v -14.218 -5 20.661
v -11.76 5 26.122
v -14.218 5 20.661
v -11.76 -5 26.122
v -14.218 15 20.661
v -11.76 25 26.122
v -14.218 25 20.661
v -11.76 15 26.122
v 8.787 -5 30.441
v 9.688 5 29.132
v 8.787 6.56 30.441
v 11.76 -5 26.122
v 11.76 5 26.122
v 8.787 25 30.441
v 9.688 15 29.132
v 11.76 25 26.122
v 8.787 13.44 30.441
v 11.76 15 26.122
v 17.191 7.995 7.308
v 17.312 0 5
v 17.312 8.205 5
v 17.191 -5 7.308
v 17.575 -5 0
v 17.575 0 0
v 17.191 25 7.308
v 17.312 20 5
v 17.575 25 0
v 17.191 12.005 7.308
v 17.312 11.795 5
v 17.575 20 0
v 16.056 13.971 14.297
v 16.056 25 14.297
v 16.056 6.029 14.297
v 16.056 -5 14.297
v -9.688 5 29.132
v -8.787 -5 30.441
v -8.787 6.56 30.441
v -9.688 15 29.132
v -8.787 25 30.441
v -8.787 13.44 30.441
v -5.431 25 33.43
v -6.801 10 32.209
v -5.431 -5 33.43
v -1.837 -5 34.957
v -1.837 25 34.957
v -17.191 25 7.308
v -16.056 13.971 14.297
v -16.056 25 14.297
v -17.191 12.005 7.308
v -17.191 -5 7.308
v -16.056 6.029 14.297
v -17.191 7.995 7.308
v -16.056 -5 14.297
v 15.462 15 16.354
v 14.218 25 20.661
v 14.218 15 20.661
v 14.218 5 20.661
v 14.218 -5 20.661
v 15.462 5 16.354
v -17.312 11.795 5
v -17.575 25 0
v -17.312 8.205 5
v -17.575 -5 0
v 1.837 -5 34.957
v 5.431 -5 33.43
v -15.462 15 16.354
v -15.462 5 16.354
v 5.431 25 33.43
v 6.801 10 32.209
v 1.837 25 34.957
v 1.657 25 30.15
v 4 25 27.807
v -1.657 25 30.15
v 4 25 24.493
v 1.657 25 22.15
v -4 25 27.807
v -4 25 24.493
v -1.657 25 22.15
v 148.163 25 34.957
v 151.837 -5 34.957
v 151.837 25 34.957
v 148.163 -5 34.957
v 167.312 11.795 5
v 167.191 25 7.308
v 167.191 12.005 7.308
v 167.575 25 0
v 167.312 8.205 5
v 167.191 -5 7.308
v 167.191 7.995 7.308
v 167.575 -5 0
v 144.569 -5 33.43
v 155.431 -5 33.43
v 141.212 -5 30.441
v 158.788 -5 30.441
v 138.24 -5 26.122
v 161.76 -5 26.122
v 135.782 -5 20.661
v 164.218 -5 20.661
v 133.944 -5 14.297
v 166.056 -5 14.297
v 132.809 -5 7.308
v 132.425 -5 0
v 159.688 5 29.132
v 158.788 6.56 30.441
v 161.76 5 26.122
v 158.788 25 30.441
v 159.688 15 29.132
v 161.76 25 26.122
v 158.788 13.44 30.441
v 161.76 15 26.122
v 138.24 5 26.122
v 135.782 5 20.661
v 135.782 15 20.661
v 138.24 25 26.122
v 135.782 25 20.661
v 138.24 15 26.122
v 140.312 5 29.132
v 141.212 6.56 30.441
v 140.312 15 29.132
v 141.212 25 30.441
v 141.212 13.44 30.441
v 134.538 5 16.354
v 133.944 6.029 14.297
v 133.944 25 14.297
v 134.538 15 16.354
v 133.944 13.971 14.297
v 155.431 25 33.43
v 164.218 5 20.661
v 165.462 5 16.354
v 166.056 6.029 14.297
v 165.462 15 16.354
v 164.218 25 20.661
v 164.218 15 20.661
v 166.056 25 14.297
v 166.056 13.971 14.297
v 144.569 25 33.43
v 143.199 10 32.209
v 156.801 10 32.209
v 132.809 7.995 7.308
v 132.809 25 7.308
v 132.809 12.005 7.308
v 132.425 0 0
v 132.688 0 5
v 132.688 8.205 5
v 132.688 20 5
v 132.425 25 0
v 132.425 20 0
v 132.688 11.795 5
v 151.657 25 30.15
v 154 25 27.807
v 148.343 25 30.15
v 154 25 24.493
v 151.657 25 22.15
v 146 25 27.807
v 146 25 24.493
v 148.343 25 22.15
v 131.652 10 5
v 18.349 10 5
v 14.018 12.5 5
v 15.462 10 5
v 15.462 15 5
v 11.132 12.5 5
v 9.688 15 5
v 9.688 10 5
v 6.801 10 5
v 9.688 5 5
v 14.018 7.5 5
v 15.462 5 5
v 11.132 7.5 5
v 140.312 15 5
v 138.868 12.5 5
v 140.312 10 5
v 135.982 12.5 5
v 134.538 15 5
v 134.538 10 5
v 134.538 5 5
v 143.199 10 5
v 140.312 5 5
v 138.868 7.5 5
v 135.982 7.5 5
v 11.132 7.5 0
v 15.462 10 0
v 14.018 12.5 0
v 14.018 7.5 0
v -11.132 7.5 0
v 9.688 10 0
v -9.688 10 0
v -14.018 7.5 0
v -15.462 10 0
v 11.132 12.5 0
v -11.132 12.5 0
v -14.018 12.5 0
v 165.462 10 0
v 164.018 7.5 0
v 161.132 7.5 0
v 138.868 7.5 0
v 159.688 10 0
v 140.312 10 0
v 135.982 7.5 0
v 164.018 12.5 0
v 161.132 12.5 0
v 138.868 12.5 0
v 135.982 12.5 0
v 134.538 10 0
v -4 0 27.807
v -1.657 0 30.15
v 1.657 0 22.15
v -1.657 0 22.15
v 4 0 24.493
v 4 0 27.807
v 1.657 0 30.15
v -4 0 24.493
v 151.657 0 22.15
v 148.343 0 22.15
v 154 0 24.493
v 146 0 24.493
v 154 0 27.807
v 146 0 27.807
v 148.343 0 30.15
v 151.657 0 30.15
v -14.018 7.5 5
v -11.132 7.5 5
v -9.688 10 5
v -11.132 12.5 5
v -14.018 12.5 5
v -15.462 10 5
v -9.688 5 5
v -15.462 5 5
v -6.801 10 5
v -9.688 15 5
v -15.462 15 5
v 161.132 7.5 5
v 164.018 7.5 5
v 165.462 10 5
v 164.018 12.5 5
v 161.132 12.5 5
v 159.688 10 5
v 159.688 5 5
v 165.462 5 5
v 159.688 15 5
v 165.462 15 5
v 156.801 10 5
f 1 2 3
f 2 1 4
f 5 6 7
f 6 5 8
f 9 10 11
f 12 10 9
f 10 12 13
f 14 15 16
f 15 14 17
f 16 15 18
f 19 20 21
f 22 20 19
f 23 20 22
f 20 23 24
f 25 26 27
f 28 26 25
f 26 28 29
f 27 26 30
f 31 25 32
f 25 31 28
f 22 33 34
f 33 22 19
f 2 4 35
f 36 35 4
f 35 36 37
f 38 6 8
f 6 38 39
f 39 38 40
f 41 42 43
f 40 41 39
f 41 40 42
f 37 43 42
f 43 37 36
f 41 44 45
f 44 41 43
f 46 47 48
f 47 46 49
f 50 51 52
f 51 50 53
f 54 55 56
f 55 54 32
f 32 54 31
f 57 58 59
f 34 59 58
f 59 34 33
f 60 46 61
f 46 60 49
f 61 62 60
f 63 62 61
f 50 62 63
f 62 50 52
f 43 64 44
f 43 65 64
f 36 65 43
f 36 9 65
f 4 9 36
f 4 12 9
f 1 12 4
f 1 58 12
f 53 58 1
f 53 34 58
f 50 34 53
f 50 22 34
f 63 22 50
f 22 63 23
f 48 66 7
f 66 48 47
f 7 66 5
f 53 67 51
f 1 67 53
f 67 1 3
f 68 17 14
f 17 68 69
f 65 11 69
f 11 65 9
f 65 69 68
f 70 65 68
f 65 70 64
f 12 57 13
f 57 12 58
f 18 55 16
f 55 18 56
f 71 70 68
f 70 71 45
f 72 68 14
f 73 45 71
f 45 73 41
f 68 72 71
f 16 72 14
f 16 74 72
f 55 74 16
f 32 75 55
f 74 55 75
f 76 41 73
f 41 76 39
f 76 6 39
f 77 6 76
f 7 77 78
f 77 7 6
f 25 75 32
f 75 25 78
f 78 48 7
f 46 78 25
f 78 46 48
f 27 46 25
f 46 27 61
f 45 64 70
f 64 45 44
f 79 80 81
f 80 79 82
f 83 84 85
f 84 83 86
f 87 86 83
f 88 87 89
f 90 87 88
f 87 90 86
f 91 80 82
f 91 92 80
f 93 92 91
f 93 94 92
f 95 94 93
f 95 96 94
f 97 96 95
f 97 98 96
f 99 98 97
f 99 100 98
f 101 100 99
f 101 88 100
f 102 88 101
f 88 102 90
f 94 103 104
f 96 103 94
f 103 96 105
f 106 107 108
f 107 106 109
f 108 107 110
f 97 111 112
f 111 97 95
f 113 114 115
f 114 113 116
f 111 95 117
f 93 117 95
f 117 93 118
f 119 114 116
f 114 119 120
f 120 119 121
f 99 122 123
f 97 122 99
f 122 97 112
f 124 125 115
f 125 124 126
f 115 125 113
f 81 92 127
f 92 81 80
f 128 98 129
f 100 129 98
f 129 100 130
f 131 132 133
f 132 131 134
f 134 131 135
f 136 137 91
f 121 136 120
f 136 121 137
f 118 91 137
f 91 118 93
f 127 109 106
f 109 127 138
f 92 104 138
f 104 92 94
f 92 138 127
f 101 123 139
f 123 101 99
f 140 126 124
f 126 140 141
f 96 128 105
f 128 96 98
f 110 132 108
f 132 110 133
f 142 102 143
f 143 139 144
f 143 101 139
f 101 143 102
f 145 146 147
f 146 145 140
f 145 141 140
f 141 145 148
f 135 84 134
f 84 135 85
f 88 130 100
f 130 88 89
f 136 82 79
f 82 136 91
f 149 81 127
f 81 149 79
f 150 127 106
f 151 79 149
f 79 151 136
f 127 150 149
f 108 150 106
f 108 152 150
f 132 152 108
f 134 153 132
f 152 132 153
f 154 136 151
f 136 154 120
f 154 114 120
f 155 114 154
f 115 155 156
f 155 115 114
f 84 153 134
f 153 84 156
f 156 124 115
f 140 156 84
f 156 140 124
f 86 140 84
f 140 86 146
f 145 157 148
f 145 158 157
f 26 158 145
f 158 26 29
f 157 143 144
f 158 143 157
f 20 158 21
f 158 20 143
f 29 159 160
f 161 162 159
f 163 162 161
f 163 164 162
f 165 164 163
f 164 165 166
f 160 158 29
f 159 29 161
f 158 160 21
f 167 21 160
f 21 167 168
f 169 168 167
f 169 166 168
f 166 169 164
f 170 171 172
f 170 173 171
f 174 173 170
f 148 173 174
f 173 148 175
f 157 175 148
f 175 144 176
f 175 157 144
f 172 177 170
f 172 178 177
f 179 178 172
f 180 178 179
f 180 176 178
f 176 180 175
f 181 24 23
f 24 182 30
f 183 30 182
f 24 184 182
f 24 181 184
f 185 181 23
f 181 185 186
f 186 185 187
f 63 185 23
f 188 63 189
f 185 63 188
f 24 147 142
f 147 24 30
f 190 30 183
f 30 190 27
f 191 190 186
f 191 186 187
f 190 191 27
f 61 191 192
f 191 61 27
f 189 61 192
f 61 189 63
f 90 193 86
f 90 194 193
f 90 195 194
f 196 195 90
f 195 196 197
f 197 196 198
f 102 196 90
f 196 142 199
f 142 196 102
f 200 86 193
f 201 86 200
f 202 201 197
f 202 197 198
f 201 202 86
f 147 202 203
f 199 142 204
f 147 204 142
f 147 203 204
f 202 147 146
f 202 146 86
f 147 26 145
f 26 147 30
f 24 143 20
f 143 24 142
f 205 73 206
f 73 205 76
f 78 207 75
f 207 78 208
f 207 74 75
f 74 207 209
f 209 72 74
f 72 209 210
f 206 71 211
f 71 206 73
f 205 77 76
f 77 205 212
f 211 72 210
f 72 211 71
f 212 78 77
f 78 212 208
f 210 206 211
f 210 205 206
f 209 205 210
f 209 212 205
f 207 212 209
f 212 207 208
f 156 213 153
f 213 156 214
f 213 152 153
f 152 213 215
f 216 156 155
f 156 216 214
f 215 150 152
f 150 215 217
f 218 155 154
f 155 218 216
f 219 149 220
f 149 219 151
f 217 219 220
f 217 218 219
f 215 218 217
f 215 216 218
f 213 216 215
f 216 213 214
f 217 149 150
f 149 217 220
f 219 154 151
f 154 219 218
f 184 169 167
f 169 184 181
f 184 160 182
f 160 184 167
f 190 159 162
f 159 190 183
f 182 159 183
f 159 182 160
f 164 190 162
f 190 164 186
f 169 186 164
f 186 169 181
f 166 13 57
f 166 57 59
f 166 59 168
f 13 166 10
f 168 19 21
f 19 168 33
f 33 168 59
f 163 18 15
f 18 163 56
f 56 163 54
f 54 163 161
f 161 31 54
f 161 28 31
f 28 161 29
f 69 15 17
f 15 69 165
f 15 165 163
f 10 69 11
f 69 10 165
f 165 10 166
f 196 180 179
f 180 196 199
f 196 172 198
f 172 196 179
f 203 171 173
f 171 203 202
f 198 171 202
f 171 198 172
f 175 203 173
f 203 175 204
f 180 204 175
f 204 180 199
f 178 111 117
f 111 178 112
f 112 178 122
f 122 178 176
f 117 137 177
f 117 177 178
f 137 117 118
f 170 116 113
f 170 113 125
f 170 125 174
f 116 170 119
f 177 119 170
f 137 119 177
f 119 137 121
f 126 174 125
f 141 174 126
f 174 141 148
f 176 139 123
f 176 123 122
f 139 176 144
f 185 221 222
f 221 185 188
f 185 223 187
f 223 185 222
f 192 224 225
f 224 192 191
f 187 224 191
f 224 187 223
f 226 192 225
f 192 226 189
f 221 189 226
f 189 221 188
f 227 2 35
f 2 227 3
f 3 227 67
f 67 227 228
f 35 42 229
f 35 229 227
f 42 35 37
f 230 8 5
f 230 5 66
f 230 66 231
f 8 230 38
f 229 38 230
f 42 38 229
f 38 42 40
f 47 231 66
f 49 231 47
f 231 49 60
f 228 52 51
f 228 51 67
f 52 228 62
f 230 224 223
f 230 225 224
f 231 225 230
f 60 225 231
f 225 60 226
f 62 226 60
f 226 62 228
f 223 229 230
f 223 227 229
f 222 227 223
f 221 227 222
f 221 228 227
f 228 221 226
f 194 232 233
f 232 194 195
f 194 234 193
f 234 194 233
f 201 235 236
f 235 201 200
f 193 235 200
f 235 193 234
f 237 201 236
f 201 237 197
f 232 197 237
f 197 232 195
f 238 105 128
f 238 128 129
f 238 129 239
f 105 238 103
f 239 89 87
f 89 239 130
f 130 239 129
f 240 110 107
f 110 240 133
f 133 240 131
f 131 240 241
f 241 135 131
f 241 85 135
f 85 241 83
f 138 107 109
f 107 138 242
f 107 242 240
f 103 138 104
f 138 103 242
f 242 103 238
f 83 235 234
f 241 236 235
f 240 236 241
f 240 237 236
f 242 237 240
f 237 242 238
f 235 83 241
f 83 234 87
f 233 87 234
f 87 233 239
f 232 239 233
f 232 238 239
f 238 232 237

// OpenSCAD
// file: vars.scad
// Variables used throughout design.
// Yes, these could use some commenting.
// (c) 2014, Christopher "ScribbleJ" Jansen

// Printer outside dimensions are actually this + corner_thick*2.
printer_w = 400;
printer_l = 400;
printer_h = 400;

// Used wherever I need something arbitrarily large.
huge=500;

// 608 Bearings
//Added some extra space to the bearing retainer so I don't break them during assembly
bearing_w = 7*1.01;  
bearing_d = 22*1.01;
bearing_r = bearing_d/2;
bearing_hole_d = 8;
bearing_hole_r = bearing_hole_d/2;

// Miscellaneous bolts, M3
misc_bolt_d = 3.2;
misc_bolt_r = misc_bolt_d/2;
misc_nut_r  = misc_bolt_d;
misc_bolt_pitch = 0.5;
misc_bolthead_d = misc_bolt_d*2;
misc_bolthead_r = misc_bolthead_d/2;

//Retainer for using a regular bolt (M8) instead of a proper leadscrew as the Z lift nut.
liftNut_d = 8;
liftNut_od = liftNut_d *2;
liftNut_h = liftNut_d * 0.8;
liftNutRetainer_h = liftNut_h ;

// Bearing retainers
//Added some extra thickness to the bearing retainer so I don't break them during assembly
retainer_shell_thick = 0.6;
retainer_shell_sep   = 0.25;
retainer_lip_thick   = 2;
retainer_inner_width = 1;

// GT2, 2mm belting
belt_w    = 6;
belt_thick= 2;
belt_sep  = retainer_lip_thick*2 + 2;

// Some calculated info about the bearing retainers.
calc_retainer_h  = retainer_lip_thick*2 + belt_w;
calc_retainer_ir = bearing_r + retainer_shell_thick*2 + retainer_shell_sep;
calc_retainer_or = calc_retainer_ir + belt_thick;
calc_retainer_b_off = retainer_lip_thick - (bearing_w-belt_w)/2;

// 20mm Tslot and associated bolt dimensions
tslot_w = 20;
tslot_bolt_d = 5;
tslot_bolt_r = tslot_bolt_d/2;
tslot_bolt_l = 4;
tslot_bolthead_d = 10;
tslot_bolthead_r = tslot_bolthead_d/2;

// This variable is called corner_thick, but it's used pretty much everywhere something needs to be sturdy but thin, not
// just on the corners.
// TODO: Anywhere it's used that's not a corner, I should make a new variable for that thing.
corner_thick = 5;
corner_length = tslot_w*3;

// 8mm Smooth Rod dimensions
rod_d=8;
rod_r=rod_d/2;

// Named because they were originally bronze bushings, now expects to be LM8UU.
bushing_d=15;
bushing_r=bushing_d/2;
bushing_l=10;
bushing_flange_r = bushing_r+3;
bushing_flange_w = 1;
bushing_material_thick = 5;

// X Axis dimensions
x_rod_sep = 50;
x_carriage_l = 50;
x_mount_sep_x = x_carriage_l - misc_bolthead_r*2*2 - misc_bolt_r*2;
x_mount_offset = bushing_r + misc_bolt_r * 2;
belt_above_x = bushing_r+misc_nut_r*2;
belt_clamp_w = 7;
x_rod_past_bearing = 20;

// Y Axis dimensions
belt_above_y = 45;
y_above_x = belt_above_x-belt_above_y;


// The standoffs for the belt idler bearings.
bearing_mount_base = corner_thick;
bearing_mount_extra = 2;
belt_above_bearing_mount = bearing_mount_base + bearing_mount_extra + retainer_lip_thick;
bearing_mount_support_tweak = 30;
y_bearing_offset = bushing_r+bushing_material_thick-calc_retainer_ir;
y_bearing_sep_y = calc_retainer_ir*2+belt_thick;
y_bearing_sep_z = belt_w+belt_sep;
bearing_bolt_r  = 4;
bearing_bolt_pitch = 1.25;
bearing_bolt_holder_thick = 4;

// Gap between Y carriage and T-slot
y_carriage_from_tslot = 2;

// 50mm Y-carriage length fits 2 LM8UU
y_carriage_len = 50;

// NEMA17 Motor Dimensions
motor_w = 42.3;
motor_h = motor_w;
motor_bolt_sep = 31.0;
motor_bolt_r   = 1.5;
// Dimensions of pulleys on X/Y Motors
motor_pulley_d = 10;
motor_pulley_r = motor_pulley_d/2;
motor_pulley_h = 5.3;  // This is the distance the pulley is above the motor body, not the height of the pulley itself.
motor_flange_d = 23;
motor_flange_r = motor_flange_d/2;
// This creates an extra hole in the motor corner for T-slot mounting, because the spaces for the motor mounts may coincide 
// with one of the standard holes.
motor_corner_extra_hole_pos = tslot_bolt_r+3;

// Some useful precalculated values
calc_corner_from_y_rod = x_rod_past_bearing+corner_thick+y_carriage_from_tslot+tslot_w;
calc_corner_above_x = belt_above_x - belt_above_bearing_mount + bearing_mount_base;
calc_motor1_above_x  = belt_above_x - motor_pulley_h;
calc_motor2_above_x  = belt_above_x - motor_pulley_h + belt_w + belt_sep;
calc_motor_from_y_rod = -bushing_r - bushing_material_thick + bearing_bolt_holder_thick + bearing_bolt_r + calc_retainer_or + motor_pulley_r;

// Motor bracket thick is 12 because I'm using M3x16 to mount the motors and the bolts can fit about 4mm into a NEMA17.
motor_bracket_thick = 12;
motor_bracket_wide = (motor_w - motor_flange_d) / 2;
motor_bracket_len  = motor_w;
motor_bolt_offset  = (motor_w - motor_bolt_sep) / 2;

// How far apart the Z smooth rods should be
z_rod_sep = 150;
z_motor_off = motor_h - tslot_w - corner_thick;

// Very important to set this for your lasercut Z, the thickness of the material you are lasering.
laser_mat_thick = 4.75;
// Laser mat margin is how much material is required outside of a tabslot.
laser_mat_margin = laser_mat_thick;
// Distance between heated bed holes, 209 is standard for a reprap heated bed
bed_mount_sep   = 209;
// Bed mounting holes will be created centered on the Z platform, and another set offset at this distance from the smooth rod:
bed_from_z      = 60;
// bed_box_r and bed_box_h here will exactly fir the lm8uu holders.  Decrease at your own peril.
bed_box_r       = 25;
bed_box_h       = 50;
z_ends_sep = printer_l - tslot_w*2 - corner_thick*2 - motor_w;
platform_l      =  laser_mat_margin*2 + laser_mat_thick*2 + bed_box_r*2 + z_ends_sep;
platform_w      = bed_mount_sep + misc_bolt_r*2 + laser_mat_margin*2;
// These settings for the leadscrew fit the leadscrews sold by MakersToolWorks
z_leadscrew_passthrough_r = 12/2;
leadscrew_bolt_offset = 22/2;
leadscrew_bolt_r = 3.2/2;
laser_bushing_fudge = 0.1; // No longer used since the change to lm8uu


// LM8UU bearing dimensions
lm8uu_d=15;
lm8uu_r=lm8uu_d/2;
lm8uu_l=24;
// The nut and bolt here refer to the ones used in the Z axis' four LM8UU holders.
lm8uu_bolt_r=5/2;
lm8uu_nut_r=10/2;

arduino_width=60;
// file: common.scad
// Common functions used in various places throughout.
// (c) 2014, Christopher "ScribbleJ" Jansen
include <vars.scad>

// Reduce radius of holes intended to hold bolts by threads.
// 0.86603 * p = nominal depth of threads.  1/3-1/2 of that is about right.
function smallhole(r,p) = r - ((p*0.86603)/3);

// Polyhole derived from Nophead's Polyhole work: http://hydraraptor.blogspot.com/2011/02/polyholes.html
module polyhole(r,h,v=6,a=0)
{
  rotate([0,0,a]) cylinder( h = h, r = r  / cos( 180 / v ), $fn = v );
}
// 2D version of Polyhole
module polycircle(r,v=6,a=0)
{
  rotate([0,0,a]) circle(r = r  / cos( 180 / v ), $fn = v );
}
// Cutout for bolthole
module bolt(bolt_r = misc_bolt_r,bolthead_r = misc_bolthead_r,bolt_len = huge,v=6,a=0)
{
  translate([0,0,-bolt_len]) polyhole(r=bolt_r,h=bolt_len+1,v=v,a=a);
  polyhole(r=bolthead_r,h=huge,v=v,a=a);
}
// 2D ring
module ring(inner=5,outer=10,v=32)
{
  difference()
  {
    circle(r=outer);
    polycircle(r=inner,v=v);
  }
} 
// 2D Rounded square
module roundsquare(dim=[50,50],r=5)
{
  translate([0,r]) square([dim[0], dim[1] - r*2]);
  translate([r,0]) square([dim[0] - r*2, dim[1]]);
  for(x=[r,dim[0]-r])
  for(y=[r,dim[1]-r])
    translate([x,y]) circle(r=r);
}
// Lasercutting Tabs
module maketabs(l=100,w=5,num=10)
{
  tablength=l/(num * 2);
  for(x=[tablength/2:tablength*2:l])
    translate([x,0]) square([tablength,w]);
}
// Support for printing bearing mount
module support(l=bearing_mount_base+bearing_mount_extra+y_bearing_sep_z+calc_retainer_b_off,w=bearing_hole_d * tan(180/6) *2,extra=0,extra_l=0)
{
  translate([-w/2,0,-l]) 
  {
    difference()
    {
      rotate([45,0,0]) cube([w,huge/2,huge/2]);
      translate([-huge/2,0,0]) cube([huge,huge,huge]);
      translate([-huge/2,-huge/2,l]) cube([huge,huge,huge]);
    }
    translate([0,-extra,-extra_l/2]) cube([w,extra,extra_l]);
  }

}
// main file
// Z end rod holder
// Print 2
// (c) 2014, Christopher "ScribbleJ" Jansen
include <common.scad>
use <platform.scad>

z_end();

module z_end(motor=false)
{
  rod_holder_r = motor_w/2 + bushing_material_thick + corner_thick + rod_r;
  difference()
  {
    union()
    {
      cube([z_rod_sep,tslot_w,corner_thick]);
      translate([0,-corner_thick,0])
      {
        scale([0.5,1,1]) rotate([-90,0,0]) cylinder(r=rod_holder_r, h=tslot_w+corner_thick*2);
        translate([z_rod_sep,0,0]) scale([0.5,1,1]) rotate([-90,0,0]) cylinder(r=rod_holder_r, h=tslot_w+corner_thick*2);
      }
    }
    translate([-huge/2,-huge/2,-huge]) cube([huge,huge,huge]);

    // Rod holders
    translate([0,0,corner_thick + motor_w/2])
    {
      rotate([-90,0,0])
      {
        polyhole(r=rod_r,h=huge,v=8,a=360/16);
        translate([z_rod_sep,0,0]) polyhole(r=rod_r,h=huge,v=8,a=360/16);
      }
    }

    // Tslot bolts
    for(x=[rod_holder_r/2 - tslot_bolthead_r,z_rod_sep - rod_holder_r/2 + tslot_bolthead_r,
           -rod_holder_r/2 + tslot_bolthead_r,z_rod_sep + rod_holder_r/2 - tslot_bolthead_r
          ])
    {
      translate([x,tslot_w/2,corner_thick]) bolt(tslot_bolt_r,tslot_bolthead_r);
    }
  }

  if(motor)
  {
    difference()
    {
      translate([z_rod_sep/2 - motor_w/2 - corner_thick, -motor_h-motor_bracket_thick+tslot_w+corner_thick,0]) cube([motor_w + corner_thick*2, motor_h + motor_bracket_thick, motor_w + corner_thick]);

      translate([z_rod_sep/2 - motor_w/2, -motor_h + tslot_w + corner_thick, corner_thick]) cube([motor_w, motor_h+1, motor_w+1]);
      translate([0,tslot_w+corner_thick,corner_thick]) rotate([45,0,0]) cube([huge,huge,huge]);
      translate([z_rod_sep/2,0,corner_thick + motor_w/2])
      {
        rotate([90,0,0]) polyhole(r=motor_flange_r,h=huge);
        for(x=[-motor_bolt_sep/2,motor_bolt_sep/2])
        for(z=[-motor_bolt_sep/2,motor_bolt_sep/2])
        {
          translate([x,0,z]) rotate([90,0,0]) polyhole(r=misc_bolt_r,h=huge);
        }
      }
    }

  }
}
